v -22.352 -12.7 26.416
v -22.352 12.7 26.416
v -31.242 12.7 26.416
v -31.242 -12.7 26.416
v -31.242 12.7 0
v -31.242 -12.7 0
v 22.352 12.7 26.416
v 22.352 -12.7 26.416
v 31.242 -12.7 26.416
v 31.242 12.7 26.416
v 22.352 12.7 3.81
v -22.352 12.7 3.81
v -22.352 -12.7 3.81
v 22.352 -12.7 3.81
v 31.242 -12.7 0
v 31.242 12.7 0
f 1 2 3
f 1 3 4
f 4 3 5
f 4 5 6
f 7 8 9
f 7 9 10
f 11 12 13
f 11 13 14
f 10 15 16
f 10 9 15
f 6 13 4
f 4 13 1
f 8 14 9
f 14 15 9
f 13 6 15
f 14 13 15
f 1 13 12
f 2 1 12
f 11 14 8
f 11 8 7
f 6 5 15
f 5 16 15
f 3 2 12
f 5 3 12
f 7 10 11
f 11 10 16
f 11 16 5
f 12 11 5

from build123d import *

# Parameters (mm, degrees)
F0_W     = 54.864
F0_H     = 25.4
F1_DEPTH = 3.81
F2_W     = 5.08
F2_H     = 25.4
F3_DEPTH = 22.606
F5_W     = 25.4
F5_H     = 22.606
F5_H_2   = 3.81
F6_DEPTH = 3.81
F4_W     = 25.4
F4_H     = 3.81
F4_H_2   = 22.606
F7_DEPTH = 3.81


with BuildPart() as f1:
    # F0 (on Top) → F1 (new body)
    with BuildSketch(Plane.XY):
        Rectangle(F0_W, F0_H)
    extrude(amount=F1_DEPTH)

    # F2 (on face) → F3 (join)
    with BuildSketch(Plane.XY.offset(3.81)):
        with Locations((-24.892, 0)):
            Rectangle(F2_W, F2_H)
        with Locations((24.892, 0)):
            Rectangle(F2_W, F2_H)
    extrude(amount=F3_DEPTH)

    # F5 (on face) → F6 (join)
    with BuildSketch(Plane.YZ.offset(27.432)):
        with Locations((0, 11.303)):
            Rectangle(F5_W, F5_H)
        with Locations((0, 24.511)):
            Rectangle(F5_W, F5_H_2)
    extrude(amount=F6_DEPTH)

    # F4 (on face) → F7 (join)
    with BuildSketch(Plane(origin=(-27.432, 0, 0), x_dir=(0, -1, 0), z_dir=(-1, 0, 0))):
        with Locations((0, 24.511)):
            Rectangle(F4_W, F4_H)
        with Locations((0, 11.303)):
            Rectangle(F4_W, F4_H_2)
    extrude(amount=F7_DEPTH)


solid = f1.part
